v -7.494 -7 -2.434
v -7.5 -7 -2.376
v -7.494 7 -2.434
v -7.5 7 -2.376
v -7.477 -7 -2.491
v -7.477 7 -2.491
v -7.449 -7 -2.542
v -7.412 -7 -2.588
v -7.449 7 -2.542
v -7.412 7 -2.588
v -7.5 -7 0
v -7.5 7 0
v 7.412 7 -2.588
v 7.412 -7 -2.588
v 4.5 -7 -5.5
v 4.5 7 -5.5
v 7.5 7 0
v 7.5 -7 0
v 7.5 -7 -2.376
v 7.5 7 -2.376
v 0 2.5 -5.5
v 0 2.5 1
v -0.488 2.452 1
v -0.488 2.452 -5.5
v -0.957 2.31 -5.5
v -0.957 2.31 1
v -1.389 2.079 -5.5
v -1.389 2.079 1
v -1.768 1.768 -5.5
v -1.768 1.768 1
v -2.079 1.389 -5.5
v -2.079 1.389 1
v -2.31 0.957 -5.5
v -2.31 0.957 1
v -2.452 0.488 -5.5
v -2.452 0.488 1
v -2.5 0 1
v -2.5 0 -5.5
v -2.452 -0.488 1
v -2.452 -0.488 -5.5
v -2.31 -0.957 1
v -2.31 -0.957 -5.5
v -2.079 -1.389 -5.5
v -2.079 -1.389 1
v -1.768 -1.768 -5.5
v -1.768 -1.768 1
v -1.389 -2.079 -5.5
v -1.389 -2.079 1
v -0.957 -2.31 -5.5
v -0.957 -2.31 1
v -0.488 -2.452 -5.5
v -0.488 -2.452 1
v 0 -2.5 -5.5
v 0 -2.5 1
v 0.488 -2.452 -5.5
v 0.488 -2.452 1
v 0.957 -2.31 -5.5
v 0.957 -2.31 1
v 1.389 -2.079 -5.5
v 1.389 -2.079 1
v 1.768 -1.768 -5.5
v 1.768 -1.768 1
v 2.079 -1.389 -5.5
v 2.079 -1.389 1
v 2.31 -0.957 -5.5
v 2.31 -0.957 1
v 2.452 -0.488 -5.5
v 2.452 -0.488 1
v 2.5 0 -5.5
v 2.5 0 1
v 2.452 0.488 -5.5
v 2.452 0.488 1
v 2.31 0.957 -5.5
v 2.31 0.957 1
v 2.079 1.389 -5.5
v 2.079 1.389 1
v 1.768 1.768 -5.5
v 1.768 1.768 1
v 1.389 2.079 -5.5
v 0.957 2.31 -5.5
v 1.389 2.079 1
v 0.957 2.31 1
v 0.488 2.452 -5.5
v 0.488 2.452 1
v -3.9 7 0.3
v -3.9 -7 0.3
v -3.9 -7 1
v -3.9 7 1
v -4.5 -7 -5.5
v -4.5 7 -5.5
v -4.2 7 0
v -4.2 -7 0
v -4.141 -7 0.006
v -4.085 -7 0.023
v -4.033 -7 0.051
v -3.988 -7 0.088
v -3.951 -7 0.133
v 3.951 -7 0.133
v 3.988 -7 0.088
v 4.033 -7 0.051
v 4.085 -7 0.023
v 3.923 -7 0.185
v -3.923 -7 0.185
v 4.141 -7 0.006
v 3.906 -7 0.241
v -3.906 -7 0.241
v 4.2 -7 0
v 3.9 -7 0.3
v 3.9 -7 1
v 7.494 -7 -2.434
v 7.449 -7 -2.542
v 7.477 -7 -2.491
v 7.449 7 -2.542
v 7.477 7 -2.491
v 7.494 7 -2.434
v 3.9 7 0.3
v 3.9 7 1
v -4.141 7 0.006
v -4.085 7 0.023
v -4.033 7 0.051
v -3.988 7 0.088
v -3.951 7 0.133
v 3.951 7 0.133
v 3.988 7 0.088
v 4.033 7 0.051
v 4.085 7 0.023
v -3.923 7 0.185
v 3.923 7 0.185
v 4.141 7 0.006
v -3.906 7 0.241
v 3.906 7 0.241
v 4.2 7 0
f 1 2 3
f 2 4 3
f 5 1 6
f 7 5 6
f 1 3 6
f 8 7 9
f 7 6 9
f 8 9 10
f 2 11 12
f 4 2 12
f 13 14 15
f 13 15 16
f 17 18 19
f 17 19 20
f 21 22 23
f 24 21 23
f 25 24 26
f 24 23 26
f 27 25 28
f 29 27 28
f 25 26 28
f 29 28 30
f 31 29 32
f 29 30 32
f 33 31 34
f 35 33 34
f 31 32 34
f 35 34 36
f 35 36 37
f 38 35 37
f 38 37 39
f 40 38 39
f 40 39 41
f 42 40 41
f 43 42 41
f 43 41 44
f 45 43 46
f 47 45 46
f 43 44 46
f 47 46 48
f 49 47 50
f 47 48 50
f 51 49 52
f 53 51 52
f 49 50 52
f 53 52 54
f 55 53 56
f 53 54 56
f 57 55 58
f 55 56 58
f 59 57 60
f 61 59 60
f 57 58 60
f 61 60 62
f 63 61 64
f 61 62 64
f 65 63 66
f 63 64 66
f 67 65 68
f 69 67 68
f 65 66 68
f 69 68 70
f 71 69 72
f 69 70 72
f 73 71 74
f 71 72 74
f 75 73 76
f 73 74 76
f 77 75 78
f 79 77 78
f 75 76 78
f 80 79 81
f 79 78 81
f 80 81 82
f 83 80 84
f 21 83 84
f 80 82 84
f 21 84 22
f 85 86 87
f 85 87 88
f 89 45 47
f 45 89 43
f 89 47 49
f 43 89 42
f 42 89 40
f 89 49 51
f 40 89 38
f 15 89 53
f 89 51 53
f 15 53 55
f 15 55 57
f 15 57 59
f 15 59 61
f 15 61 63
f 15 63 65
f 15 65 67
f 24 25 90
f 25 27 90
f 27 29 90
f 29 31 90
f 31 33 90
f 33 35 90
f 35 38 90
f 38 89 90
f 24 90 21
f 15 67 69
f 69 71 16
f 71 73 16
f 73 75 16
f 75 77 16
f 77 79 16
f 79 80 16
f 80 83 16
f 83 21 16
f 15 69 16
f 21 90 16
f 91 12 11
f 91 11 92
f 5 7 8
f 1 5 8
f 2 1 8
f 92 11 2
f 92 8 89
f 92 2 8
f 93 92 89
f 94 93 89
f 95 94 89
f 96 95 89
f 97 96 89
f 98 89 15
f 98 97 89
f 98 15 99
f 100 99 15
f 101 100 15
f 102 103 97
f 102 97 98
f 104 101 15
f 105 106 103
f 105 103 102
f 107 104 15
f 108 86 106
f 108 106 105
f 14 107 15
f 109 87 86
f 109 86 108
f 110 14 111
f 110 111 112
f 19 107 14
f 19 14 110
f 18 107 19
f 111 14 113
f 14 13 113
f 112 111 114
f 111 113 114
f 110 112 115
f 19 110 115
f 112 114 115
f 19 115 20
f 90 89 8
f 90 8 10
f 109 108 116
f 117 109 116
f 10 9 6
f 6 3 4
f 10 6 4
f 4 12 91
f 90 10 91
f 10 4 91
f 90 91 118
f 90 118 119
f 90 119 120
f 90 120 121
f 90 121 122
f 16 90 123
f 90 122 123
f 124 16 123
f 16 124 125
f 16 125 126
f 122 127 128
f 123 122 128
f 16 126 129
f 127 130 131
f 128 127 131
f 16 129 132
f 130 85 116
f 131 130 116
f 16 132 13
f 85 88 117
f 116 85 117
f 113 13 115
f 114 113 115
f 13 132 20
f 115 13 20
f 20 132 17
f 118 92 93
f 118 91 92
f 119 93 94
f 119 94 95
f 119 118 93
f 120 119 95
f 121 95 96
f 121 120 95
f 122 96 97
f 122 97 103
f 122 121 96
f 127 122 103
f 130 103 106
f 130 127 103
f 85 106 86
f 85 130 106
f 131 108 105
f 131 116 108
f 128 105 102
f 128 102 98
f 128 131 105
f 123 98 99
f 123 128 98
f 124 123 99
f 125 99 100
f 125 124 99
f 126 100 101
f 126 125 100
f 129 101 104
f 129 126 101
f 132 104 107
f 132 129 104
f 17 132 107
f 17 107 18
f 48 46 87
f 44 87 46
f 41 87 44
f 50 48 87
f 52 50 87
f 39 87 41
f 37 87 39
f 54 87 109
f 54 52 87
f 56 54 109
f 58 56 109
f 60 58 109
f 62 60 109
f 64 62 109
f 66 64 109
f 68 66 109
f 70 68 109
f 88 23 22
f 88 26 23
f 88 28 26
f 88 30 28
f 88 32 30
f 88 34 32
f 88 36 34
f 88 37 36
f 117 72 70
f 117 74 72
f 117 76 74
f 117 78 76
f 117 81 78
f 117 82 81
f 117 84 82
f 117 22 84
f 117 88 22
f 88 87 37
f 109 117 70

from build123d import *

# Parameters (mm, degrees)
SKETCH1_W      = 15
SKETCH1_H      = 14
EXTRUDE1_DEPTH = 5.5
SKETCH2_W      = 7.8
SKETCH2_H      = 14
EXTRUDE2_DEPTH = 1
SKETCH7_W      = 2.5
SKETCH7_H      = 6.500025
CHAMFER1_SIZE  = 3
FILLET1_R      = 0.3


with BuildPart() as part:
    # Sketch1 → Extrude1 (new body)
    with BuildSketch(Plane.XY):
        Rectangle(SKETCH1_W, SKETCH1_H)
    extrude(amount=-EXTRUDE1_DEPTH)

    # Sketch2 → Extrude2 (add)
    with BuildSketch(Plane.XY):
        Rectangle(SKETCH2_W, SKETCH2_H)
    extrude(amount=EXTRUDE2_DEPTH)

    # Sketch7 → M6x1.0 Tapped Hole1 (revolve, cut)
    with BuildSketch(Plane(origin=(0, 0, -5.5), x_dir=(0, 1, 0), z_dir=(1, 0, 0))):
        with Locations((1.25, 3.2500125)):
            Rectangle(SKETCH7_W, SKETCH7_H)
    revolve(axis=Axis((0, 0, -11.85), (0, 0, 1)), mode=Mode.SUBTRACT)

    # Chamfer1
    chamfer1_edges = [part.edges().sort_by_distance(p)[0] for p in [
        (7.5, 0, -5.5),
        (-7.5, 0, -5.5),
    ]]
    chamfer(chamfer1_edges, length=CHAMFER1_SIZE)

    # Fillet1
    fillet1_edges = [part.edges().sort_by_distance(p)[0] for p in [
        (-3.9, 0, 0),
        (3.9, 0, 0),
        (7.5, 0, -2.5),
        (-7.5, 0, -2.5),
    ]]
    fillet(fillet1_edges, radius=FILLET1_R)


solid = part.part
